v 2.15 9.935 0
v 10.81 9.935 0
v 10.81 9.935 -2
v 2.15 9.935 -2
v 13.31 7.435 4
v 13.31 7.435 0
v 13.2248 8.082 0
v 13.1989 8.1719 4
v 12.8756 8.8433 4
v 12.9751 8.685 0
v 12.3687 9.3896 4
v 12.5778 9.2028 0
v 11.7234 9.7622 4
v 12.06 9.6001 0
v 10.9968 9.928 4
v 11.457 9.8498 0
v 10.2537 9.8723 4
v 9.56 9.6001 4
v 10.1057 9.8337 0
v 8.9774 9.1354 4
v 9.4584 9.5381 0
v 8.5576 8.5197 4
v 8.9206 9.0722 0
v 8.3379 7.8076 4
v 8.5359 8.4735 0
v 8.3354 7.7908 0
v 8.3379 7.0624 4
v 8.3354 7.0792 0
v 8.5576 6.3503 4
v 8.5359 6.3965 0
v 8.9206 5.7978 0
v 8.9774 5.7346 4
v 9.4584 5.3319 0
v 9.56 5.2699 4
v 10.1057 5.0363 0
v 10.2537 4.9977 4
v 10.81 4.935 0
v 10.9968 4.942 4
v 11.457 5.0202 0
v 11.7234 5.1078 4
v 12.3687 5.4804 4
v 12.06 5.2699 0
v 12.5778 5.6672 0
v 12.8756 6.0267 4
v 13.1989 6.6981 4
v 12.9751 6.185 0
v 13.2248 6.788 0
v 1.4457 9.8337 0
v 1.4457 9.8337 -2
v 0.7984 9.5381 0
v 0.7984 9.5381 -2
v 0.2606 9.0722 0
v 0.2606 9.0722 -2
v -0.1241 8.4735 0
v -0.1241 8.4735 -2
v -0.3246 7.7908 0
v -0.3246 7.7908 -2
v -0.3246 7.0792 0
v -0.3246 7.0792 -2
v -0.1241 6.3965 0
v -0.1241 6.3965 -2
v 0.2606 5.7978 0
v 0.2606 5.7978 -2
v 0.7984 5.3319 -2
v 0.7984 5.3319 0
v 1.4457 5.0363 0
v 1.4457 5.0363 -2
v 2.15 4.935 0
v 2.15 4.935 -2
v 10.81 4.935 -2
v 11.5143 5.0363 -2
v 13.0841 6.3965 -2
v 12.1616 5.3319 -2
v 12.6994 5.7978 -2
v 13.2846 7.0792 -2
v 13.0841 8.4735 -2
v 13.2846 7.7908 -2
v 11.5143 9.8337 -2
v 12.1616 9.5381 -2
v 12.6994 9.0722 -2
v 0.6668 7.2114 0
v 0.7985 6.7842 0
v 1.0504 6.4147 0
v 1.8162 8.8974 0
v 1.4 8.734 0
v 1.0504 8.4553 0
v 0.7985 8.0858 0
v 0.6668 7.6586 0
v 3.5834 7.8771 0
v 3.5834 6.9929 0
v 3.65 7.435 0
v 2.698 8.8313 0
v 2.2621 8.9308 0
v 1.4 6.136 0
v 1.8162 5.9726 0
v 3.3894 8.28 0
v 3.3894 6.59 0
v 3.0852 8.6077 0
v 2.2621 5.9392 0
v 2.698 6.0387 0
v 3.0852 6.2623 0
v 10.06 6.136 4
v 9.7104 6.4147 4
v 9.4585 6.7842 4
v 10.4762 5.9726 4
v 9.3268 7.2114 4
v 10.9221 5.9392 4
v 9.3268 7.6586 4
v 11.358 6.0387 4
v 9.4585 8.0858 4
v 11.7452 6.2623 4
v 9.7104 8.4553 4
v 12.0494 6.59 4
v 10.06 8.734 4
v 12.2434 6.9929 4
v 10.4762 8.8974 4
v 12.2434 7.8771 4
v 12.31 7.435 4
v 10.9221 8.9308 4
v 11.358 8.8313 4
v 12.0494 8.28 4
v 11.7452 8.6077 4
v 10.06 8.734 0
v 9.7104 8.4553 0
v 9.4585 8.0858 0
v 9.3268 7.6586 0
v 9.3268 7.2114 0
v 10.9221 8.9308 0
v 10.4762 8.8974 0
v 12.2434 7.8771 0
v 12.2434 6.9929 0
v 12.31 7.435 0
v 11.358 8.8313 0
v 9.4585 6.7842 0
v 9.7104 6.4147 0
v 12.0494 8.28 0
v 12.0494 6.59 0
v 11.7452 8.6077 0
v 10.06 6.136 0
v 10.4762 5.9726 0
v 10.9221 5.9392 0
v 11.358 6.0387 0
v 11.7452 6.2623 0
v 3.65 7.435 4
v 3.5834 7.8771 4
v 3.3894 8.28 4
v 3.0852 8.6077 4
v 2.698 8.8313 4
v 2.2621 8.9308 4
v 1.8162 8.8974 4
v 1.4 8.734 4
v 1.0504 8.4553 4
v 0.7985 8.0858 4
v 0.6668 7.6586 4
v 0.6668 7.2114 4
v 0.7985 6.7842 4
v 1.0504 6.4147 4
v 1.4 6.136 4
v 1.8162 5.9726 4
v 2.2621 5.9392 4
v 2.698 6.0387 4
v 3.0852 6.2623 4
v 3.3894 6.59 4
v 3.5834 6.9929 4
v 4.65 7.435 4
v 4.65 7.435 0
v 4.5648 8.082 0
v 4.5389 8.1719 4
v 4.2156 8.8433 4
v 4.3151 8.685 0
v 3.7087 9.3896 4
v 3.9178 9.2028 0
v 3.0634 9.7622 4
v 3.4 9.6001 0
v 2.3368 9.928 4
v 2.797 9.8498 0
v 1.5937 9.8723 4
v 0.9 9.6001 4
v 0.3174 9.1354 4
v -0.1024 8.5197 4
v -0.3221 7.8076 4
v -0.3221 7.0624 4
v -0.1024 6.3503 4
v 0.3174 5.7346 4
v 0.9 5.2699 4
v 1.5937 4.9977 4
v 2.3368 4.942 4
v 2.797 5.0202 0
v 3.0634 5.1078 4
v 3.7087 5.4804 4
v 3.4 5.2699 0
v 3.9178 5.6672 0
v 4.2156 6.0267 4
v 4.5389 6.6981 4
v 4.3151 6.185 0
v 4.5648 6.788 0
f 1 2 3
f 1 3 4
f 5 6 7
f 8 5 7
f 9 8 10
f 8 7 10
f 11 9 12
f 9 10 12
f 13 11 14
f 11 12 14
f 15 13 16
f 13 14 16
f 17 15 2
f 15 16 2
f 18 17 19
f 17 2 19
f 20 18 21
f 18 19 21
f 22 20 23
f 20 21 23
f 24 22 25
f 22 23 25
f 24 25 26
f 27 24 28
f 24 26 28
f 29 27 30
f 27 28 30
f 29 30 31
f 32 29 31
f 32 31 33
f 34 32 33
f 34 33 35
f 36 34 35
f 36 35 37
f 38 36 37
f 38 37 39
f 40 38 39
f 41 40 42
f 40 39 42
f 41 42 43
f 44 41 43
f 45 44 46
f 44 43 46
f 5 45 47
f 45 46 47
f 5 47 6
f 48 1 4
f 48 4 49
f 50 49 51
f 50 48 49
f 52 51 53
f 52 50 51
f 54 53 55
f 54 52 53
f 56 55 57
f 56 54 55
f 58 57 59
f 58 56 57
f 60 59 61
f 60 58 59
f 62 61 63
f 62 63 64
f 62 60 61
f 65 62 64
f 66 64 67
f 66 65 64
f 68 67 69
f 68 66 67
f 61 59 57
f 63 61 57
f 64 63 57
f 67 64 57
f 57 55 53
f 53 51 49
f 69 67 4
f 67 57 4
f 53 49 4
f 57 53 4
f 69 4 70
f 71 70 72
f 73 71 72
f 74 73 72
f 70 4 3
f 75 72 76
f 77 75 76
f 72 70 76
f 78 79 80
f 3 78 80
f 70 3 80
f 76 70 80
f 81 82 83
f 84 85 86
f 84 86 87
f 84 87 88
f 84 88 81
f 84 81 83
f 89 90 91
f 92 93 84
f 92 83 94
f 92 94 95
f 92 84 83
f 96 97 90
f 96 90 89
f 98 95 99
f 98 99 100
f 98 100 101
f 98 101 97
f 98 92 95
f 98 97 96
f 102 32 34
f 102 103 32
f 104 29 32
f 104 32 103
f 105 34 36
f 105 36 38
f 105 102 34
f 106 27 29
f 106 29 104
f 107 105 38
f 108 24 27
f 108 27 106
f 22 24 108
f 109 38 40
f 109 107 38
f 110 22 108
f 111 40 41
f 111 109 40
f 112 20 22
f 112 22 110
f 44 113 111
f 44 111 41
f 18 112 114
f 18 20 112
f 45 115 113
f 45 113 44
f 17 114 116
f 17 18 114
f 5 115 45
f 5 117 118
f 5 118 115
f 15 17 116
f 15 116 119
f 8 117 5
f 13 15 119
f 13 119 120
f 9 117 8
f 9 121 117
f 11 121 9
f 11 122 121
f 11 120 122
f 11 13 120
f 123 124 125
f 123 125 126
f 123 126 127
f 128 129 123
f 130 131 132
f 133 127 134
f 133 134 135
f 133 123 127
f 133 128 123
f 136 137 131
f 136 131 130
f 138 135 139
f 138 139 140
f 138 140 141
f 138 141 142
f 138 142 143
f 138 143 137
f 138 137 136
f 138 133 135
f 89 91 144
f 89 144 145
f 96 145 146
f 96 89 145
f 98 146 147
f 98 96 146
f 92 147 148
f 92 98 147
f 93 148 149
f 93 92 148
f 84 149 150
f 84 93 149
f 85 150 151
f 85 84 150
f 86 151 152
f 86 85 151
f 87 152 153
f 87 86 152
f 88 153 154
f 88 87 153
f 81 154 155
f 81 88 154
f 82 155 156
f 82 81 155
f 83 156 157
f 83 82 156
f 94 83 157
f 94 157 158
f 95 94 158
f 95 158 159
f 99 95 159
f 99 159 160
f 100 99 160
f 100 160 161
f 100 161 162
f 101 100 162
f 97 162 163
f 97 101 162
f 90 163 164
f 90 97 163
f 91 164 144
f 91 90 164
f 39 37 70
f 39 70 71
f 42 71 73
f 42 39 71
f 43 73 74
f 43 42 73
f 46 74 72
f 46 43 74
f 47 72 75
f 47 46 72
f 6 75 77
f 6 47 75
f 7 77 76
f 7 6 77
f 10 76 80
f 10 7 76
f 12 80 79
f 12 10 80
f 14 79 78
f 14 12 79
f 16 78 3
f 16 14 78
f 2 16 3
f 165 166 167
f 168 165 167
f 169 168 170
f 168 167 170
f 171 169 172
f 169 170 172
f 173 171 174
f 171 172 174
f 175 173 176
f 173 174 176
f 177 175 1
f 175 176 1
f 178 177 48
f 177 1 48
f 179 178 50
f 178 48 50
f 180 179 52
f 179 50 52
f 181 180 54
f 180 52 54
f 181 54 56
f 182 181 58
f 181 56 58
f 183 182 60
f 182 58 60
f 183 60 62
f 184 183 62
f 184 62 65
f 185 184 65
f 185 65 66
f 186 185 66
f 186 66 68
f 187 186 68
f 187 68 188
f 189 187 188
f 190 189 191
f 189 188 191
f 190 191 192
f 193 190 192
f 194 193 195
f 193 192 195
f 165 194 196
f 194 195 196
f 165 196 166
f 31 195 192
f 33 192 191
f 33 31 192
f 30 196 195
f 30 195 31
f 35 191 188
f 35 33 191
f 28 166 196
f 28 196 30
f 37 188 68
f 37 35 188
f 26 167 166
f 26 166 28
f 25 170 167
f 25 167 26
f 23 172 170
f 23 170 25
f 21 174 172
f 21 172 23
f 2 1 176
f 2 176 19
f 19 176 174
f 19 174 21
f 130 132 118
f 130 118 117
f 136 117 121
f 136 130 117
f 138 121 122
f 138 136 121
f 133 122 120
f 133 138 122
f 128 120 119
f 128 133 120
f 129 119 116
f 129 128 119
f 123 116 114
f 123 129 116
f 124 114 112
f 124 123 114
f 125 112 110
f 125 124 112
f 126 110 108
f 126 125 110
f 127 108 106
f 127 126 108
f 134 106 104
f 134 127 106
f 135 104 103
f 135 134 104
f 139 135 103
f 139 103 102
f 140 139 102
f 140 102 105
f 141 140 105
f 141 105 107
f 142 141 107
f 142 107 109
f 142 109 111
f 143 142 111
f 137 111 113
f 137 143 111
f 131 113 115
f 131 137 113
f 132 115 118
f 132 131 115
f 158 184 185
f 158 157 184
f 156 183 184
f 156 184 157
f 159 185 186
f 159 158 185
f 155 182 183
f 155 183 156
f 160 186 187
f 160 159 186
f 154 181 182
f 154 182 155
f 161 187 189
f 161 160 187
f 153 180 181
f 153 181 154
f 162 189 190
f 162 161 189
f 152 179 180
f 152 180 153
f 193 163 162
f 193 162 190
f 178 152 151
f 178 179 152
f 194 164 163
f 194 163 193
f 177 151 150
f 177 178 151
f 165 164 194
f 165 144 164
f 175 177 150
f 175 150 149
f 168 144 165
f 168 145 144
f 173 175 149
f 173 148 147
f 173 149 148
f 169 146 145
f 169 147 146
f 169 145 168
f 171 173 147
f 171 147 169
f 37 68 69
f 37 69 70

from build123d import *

# Parameters (mm, degrees)
SKETCH030_R      = 1.5
EXTRUDE031_DEPTH = 4
SKETCH031_R      = 2.5
EXTRUDE030_DEPTH = 4
EXTRUDE037_DEPTH = 2


with BuildPart() as extrude_microusbbreakout_holes:
    # Sketch030 → Extrude031 (new body)
    with BuildSketch(Plane.XY):
        with Locations((2.15, 7.435)):
            Circle(SKETCH030_R)
        with Locations((10.81, 7.435)):
            Circle(SKETCH030_R)
    extrude(amount=EXTRUDE031_DEPTH)


with BuildPart() as cut_microusbbreakout_stand001:
    # Sketch031 → Extrude030 (new body)
    with BuildSketch(Plane.XY):
        with Locations((2.15, 7.435)):
            Circle(SKETCH031_R)
        with Locations((10.81, 7.435)):
            Circle(SKETCH031_R)
    extrude(amount=EXTRUDE030_DEPTH)

    # Cut004: cut Extrude_MicroUSBBreakout_holes
    add(extrude_microusbbreakout_holes.part, mode=Mode.SUBTRACT)


with BuildPart() as cut_microusbbreakout_stand001_1:
    # Cut004 placement: moved
    add(cut_microusbbreakout_stand001.part.moved(Location((37, 37.9, 2))))


with BuildPart() as cut_microusbbreakout_stand001_2:
    # Link005 placement: moved
    add(cut_microusbbreakout_stand001_1.part.moved(Location((-37, -37.9, -2))))


with BuildPart() as fusion_microusbbreakoutbasetest:
    # Sketch037 → Extrude037 (new body)
    with BuildSketch(Plane.XY):
        with BuildLine():
            ThreePointArc((2.15, 9.935), (-0.35, 7.435), (2.15, 4.935))
            Line((2.15, 4.935), (10.81, 4.935))
            ThreePointArc((10.81, 4.935), (13.31, 7.435), (10.81, 9.935))
            Line((10.81, 9.935), (2.15, 9.935))
        make_face()
    extrude(amount=-EXTRUDE037_DEPTH)

    # Fusion010: union Cut_MicroUSBBreakout_stand001
    add(cut_microusbbreakout_stand001_2.part)


solid = fusion_microusbbreakoutbasetest.part
